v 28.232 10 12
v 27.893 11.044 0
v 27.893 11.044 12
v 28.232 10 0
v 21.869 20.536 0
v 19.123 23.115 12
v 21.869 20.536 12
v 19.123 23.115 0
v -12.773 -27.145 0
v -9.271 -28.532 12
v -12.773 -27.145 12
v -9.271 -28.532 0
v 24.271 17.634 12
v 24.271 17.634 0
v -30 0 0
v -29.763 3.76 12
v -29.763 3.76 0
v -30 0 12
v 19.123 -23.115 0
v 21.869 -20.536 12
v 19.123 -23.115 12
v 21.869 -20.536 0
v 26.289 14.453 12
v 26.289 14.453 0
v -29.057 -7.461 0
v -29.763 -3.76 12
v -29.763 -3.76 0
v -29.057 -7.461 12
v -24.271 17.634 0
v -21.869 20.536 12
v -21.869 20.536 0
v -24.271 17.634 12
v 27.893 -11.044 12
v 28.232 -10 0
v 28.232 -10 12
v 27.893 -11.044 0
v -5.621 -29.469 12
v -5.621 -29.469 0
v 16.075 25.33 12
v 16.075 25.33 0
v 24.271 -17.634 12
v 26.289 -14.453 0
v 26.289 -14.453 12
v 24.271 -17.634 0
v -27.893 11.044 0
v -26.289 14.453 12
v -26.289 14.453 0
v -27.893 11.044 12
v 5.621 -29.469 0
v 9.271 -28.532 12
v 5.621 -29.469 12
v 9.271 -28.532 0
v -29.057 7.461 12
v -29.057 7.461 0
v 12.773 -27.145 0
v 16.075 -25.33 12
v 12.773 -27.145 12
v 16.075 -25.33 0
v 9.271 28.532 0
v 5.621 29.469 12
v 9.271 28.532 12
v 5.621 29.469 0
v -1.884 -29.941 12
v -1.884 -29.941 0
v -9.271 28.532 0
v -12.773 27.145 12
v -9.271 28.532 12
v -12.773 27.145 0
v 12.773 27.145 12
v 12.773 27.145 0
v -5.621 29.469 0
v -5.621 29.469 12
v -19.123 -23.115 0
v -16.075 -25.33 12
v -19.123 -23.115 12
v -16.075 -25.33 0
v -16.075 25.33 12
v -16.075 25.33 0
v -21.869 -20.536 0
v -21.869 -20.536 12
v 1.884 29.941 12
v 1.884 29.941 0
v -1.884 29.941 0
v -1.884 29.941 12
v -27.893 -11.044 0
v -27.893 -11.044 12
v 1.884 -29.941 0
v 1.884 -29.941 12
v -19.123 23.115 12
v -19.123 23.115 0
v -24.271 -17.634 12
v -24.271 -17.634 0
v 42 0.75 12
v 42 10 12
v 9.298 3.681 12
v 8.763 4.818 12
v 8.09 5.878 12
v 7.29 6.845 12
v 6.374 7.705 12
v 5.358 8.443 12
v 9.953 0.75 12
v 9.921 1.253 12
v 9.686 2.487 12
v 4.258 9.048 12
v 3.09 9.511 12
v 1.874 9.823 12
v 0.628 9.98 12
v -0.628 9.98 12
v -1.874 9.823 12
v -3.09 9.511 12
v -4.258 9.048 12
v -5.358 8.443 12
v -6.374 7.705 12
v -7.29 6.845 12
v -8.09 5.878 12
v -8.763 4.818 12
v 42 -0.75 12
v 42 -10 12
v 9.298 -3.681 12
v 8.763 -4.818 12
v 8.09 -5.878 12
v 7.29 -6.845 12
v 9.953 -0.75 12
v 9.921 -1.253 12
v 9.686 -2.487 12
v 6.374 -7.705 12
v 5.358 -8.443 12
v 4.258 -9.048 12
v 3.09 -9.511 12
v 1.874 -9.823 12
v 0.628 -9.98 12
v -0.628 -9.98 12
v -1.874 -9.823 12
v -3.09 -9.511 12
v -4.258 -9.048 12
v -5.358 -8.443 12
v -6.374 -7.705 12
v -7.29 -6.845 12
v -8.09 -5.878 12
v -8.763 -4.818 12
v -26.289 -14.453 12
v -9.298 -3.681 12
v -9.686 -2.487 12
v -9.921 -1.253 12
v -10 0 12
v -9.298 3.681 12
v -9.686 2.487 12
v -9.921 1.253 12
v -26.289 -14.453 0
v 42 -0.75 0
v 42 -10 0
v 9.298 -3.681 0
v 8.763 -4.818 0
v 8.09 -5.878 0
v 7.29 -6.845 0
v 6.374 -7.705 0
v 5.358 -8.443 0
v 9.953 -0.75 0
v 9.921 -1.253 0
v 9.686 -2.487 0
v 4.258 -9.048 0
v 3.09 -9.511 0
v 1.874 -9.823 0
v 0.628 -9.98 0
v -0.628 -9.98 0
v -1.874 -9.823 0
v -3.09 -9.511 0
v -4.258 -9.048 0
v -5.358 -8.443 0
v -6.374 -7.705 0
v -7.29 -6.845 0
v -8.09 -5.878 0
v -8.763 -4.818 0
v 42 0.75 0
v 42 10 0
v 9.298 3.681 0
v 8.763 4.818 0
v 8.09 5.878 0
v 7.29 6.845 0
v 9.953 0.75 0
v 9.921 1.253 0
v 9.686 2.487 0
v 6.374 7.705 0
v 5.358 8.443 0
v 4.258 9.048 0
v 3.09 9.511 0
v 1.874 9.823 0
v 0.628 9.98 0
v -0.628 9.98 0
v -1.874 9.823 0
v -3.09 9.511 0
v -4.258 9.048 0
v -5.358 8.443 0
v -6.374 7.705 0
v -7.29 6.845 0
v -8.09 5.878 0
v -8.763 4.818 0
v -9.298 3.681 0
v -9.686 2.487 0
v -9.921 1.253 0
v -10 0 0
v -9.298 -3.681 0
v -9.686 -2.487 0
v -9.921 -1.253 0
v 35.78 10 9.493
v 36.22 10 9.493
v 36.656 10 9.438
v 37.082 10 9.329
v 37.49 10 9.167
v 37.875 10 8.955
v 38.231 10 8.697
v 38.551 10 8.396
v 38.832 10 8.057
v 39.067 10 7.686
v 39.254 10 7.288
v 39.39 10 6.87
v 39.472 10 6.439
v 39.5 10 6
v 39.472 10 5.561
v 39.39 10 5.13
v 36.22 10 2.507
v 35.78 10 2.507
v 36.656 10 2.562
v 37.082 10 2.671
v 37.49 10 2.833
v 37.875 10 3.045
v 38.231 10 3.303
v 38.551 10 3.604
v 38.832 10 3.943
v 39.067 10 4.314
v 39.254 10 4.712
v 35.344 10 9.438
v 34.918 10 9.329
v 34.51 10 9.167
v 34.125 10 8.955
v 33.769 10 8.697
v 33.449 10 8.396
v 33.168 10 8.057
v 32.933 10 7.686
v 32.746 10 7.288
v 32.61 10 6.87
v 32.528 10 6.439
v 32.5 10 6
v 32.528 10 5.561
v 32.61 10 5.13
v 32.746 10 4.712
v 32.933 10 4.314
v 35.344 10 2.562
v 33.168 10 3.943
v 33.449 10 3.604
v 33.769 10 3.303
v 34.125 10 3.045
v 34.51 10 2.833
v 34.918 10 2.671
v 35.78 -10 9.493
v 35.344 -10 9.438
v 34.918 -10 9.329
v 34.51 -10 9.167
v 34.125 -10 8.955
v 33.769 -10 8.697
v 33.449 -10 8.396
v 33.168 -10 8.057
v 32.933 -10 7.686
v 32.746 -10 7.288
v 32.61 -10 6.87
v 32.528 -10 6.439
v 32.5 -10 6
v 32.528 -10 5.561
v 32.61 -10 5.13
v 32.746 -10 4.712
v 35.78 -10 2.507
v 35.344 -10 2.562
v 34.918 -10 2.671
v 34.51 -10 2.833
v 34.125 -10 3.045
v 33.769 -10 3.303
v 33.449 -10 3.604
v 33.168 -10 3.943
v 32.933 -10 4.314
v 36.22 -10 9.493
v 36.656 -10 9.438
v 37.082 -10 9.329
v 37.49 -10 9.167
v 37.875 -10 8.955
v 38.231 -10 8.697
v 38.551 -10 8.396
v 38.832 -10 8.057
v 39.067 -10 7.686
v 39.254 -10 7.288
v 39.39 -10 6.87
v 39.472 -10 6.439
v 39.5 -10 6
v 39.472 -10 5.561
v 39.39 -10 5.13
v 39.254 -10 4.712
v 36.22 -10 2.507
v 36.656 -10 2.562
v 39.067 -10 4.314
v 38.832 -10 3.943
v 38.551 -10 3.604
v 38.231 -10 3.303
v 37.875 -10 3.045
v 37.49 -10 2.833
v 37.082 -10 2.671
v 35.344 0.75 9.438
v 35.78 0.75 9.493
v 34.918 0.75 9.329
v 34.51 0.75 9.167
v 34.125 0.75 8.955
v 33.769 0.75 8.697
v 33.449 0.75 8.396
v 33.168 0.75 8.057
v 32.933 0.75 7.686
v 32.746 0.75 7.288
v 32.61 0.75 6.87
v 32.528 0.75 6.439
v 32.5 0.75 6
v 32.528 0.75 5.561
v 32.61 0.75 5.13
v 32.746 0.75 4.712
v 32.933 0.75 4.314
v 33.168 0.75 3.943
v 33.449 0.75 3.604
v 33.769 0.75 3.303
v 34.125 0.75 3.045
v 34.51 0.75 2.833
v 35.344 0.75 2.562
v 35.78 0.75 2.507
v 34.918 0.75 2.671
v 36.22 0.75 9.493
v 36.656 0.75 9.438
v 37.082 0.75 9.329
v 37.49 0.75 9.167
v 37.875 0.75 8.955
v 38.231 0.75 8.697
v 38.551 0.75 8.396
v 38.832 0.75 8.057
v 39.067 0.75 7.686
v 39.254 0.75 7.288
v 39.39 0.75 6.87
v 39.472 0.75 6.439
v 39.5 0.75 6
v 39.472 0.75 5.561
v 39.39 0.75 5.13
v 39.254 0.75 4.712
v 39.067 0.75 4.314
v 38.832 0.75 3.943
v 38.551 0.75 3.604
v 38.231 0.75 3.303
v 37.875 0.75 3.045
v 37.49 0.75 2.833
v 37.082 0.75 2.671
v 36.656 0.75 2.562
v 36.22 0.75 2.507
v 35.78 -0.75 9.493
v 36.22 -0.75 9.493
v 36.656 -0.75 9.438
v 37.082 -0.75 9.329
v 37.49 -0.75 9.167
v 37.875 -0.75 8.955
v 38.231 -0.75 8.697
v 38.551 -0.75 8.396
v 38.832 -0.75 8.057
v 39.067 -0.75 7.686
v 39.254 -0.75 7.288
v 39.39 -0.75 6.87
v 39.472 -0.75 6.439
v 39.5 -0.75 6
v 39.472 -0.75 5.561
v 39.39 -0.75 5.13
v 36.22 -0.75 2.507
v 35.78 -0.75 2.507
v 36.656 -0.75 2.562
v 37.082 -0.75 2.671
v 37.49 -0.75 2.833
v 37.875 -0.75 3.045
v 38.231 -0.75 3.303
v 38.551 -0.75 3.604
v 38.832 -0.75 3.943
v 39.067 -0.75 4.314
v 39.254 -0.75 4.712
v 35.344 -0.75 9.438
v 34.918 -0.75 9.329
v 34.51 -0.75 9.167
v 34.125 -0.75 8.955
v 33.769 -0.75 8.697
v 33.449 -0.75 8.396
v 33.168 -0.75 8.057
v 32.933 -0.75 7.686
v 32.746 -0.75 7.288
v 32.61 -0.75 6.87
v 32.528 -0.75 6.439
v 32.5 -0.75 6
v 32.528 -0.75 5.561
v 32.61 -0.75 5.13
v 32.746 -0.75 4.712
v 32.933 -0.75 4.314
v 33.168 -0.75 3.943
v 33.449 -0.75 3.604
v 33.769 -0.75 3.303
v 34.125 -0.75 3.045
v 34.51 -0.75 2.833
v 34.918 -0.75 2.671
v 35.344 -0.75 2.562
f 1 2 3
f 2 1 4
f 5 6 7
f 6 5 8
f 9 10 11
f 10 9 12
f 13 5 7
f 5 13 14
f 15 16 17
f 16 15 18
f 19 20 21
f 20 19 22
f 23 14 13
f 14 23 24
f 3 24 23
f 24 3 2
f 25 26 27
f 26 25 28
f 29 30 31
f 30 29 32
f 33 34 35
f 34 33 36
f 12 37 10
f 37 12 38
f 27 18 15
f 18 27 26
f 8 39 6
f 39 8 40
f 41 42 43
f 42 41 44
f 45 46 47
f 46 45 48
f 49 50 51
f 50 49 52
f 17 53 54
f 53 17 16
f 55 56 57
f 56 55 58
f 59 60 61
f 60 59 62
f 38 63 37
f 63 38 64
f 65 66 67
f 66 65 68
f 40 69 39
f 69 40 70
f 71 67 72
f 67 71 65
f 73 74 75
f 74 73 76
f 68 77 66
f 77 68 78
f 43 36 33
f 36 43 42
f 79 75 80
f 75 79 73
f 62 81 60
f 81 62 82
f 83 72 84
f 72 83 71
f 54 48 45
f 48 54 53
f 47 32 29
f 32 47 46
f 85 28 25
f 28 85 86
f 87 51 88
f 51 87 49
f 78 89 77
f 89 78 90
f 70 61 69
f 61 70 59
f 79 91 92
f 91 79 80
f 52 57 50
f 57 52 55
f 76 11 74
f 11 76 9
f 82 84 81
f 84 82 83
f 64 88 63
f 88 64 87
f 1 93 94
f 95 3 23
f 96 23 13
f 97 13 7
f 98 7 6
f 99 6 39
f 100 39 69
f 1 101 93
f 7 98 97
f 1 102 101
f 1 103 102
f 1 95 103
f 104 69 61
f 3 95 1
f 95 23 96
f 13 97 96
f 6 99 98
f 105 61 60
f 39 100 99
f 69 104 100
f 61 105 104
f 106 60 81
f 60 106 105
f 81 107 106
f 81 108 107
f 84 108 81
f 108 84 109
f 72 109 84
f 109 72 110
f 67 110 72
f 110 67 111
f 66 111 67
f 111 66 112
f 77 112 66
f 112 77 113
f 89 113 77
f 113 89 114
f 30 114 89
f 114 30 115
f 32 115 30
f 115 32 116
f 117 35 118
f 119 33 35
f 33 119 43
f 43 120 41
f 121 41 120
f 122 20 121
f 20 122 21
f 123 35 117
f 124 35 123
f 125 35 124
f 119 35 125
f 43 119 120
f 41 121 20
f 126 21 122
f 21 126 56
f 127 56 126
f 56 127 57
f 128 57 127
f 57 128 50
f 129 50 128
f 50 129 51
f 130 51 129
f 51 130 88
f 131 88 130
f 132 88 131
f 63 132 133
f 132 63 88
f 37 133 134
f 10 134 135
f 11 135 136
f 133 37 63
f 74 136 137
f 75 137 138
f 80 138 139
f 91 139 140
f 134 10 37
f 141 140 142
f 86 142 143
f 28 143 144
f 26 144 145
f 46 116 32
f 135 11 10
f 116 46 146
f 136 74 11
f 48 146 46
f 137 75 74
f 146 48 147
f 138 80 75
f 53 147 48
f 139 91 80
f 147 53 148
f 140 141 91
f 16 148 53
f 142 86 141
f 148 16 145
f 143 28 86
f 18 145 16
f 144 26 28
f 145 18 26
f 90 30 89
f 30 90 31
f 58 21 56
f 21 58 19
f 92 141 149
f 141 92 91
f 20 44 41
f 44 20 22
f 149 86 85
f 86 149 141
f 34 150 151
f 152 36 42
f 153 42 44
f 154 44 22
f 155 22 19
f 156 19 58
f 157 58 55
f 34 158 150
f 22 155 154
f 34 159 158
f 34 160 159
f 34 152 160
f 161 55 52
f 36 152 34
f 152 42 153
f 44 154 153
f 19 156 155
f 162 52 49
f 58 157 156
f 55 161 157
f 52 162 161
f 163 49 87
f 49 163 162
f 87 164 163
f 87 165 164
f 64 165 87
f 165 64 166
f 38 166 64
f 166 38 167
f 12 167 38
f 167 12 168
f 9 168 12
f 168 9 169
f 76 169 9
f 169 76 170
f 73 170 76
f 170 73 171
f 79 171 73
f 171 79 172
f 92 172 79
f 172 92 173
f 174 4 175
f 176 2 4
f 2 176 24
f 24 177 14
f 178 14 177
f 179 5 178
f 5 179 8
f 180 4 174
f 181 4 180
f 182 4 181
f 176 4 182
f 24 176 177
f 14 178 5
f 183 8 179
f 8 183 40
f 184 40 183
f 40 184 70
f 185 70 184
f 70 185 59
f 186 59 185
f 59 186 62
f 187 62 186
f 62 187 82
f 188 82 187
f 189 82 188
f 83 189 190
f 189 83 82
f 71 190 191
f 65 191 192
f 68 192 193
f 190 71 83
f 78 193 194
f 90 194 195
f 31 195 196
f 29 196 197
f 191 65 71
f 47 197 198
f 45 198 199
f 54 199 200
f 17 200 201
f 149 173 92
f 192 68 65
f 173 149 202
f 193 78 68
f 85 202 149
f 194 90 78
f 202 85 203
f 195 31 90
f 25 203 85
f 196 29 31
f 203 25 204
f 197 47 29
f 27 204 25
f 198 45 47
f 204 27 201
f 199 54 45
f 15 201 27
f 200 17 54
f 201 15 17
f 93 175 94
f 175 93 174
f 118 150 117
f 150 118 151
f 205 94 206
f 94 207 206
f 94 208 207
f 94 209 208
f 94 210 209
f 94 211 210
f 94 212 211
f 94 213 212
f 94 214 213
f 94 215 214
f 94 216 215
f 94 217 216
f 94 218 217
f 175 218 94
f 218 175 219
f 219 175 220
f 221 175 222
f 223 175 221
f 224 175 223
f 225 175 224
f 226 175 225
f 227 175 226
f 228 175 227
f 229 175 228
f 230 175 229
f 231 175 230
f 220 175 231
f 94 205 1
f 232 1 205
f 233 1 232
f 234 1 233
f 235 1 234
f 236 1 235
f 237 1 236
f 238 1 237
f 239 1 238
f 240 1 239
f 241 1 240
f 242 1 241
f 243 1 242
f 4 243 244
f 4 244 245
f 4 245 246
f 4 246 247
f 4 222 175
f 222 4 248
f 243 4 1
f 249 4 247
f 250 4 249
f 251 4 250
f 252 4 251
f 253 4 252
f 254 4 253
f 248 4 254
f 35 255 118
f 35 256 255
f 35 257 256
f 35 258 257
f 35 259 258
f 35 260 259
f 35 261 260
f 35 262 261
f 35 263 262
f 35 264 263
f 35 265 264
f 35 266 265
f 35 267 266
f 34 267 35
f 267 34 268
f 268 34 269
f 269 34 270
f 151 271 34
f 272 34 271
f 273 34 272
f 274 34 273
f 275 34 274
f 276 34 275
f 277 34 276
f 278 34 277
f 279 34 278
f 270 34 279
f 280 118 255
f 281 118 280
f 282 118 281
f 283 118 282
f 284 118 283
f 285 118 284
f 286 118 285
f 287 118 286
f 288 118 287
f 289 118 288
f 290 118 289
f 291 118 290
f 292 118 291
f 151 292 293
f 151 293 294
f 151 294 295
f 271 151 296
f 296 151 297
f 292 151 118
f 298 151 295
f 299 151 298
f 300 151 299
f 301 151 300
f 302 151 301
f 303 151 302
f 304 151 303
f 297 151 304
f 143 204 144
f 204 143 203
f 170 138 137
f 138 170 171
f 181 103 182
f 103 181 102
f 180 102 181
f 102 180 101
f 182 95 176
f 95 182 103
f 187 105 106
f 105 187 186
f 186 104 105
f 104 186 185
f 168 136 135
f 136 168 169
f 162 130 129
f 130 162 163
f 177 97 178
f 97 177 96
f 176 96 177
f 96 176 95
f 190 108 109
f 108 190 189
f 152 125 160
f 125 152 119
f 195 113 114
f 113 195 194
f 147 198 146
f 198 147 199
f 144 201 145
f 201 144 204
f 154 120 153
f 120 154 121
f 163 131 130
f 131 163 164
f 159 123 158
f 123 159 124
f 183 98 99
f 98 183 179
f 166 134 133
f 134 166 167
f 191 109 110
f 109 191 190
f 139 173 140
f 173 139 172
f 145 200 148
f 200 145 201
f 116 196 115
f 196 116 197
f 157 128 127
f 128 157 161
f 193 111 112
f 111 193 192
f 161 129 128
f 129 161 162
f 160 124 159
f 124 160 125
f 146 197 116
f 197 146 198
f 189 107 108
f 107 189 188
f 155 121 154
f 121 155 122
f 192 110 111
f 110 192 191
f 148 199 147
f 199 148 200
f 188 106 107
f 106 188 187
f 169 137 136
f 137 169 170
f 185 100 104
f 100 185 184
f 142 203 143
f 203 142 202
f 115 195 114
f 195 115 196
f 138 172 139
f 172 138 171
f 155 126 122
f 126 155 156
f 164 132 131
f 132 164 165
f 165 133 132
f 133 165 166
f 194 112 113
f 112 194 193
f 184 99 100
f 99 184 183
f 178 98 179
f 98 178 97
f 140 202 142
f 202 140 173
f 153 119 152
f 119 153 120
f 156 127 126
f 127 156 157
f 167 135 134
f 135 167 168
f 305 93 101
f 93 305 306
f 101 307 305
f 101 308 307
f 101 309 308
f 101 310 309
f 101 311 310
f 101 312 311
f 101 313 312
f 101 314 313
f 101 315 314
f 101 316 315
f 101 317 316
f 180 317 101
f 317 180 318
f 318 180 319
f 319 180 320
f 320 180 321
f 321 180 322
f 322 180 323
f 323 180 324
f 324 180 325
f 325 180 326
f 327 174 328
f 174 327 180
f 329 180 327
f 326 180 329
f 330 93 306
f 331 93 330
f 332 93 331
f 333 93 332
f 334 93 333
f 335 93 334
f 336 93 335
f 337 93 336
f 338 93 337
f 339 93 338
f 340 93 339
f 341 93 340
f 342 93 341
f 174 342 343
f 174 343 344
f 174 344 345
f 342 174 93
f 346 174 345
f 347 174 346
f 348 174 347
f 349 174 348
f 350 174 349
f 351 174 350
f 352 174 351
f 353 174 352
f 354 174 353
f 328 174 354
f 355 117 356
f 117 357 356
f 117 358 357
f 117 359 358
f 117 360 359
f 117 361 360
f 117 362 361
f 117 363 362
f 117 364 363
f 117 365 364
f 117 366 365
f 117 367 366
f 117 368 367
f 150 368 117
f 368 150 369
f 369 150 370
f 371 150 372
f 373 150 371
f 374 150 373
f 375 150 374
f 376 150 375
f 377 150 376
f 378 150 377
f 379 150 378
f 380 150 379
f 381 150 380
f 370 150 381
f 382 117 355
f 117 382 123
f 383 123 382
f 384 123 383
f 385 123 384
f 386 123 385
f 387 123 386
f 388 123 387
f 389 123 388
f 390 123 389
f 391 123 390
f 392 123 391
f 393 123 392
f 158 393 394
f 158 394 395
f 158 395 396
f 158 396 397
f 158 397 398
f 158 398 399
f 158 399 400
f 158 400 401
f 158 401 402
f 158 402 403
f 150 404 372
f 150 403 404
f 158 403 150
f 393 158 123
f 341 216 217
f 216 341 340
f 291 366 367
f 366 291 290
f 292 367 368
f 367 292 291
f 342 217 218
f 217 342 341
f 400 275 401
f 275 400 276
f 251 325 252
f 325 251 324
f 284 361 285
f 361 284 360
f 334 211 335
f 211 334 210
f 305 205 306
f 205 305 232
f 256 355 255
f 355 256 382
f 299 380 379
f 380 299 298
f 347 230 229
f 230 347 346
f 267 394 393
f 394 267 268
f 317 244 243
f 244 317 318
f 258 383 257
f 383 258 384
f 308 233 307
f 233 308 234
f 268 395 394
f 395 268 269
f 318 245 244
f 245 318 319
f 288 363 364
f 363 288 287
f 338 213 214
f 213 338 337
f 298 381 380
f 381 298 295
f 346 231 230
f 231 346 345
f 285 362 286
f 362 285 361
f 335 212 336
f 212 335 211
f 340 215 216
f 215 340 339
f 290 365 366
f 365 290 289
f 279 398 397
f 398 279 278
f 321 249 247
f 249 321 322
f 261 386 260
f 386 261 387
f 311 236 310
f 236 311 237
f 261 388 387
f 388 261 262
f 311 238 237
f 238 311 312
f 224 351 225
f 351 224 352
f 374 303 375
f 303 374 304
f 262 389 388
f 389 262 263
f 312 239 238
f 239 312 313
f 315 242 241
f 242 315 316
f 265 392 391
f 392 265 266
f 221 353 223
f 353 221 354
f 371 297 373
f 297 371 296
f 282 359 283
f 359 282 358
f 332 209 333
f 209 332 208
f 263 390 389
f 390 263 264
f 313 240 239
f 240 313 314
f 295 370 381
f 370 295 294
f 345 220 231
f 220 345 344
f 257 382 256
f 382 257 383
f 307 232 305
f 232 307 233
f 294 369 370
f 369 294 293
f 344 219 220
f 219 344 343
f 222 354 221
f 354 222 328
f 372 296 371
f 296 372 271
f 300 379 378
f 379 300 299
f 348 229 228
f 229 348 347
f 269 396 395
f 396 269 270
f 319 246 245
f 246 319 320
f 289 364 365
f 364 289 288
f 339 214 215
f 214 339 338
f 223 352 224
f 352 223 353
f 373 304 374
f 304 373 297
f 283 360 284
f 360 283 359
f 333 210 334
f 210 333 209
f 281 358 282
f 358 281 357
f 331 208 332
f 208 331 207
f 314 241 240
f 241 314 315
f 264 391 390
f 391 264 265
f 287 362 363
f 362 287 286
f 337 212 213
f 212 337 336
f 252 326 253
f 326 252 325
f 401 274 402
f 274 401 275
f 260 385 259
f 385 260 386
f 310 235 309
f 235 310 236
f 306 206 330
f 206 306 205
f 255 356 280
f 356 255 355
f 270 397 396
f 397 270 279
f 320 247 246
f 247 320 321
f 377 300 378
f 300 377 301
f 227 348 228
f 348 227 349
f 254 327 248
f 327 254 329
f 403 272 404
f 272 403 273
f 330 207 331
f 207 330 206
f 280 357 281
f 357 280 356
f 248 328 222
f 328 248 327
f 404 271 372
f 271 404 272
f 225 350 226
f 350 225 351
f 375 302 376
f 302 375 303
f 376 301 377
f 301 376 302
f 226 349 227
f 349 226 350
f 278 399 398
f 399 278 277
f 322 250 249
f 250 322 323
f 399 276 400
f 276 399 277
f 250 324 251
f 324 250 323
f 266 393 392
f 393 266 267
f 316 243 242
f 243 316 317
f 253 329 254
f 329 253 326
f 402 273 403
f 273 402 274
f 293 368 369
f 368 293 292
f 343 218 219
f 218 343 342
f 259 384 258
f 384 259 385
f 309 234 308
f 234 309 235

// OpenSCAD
// Split pipe clamp. All dimensions are millimeters.
// Preview with F5, then render with F6 before exporting.

/* [Clamp] */
// Radius of the pipe bore; add any desired fit allowance here.
pipe_radius = 10;
clamp_height = 12;
// Radial material thickness, not the outside radius.
wall_thickness = 20;
// Radius of the transverse screw hole.
screw_radius = 3.5;
slit_width = 1.5;

/* [Tabs] */
tab_length = 14;
// Tab extent on each side of the slit centerline.
tab_depth = 10;
tab_overlap = 2;

/* [Hidden] */
epsilon = 0.01;
$fn = 50;

outer_radius = pipe_radius + wall_thickness;
screw_x = outer_radius + (tab_length - tab_overlap) / 2;
cut_height = clamp_height + 2 * epsilon;

difference() {
    union() {
        cylinder(r = outer_radius, h = clamp_height);

        translate([outer_radius - tab_overlap, -tab_depth, 0])
            cube([tab_length, 2 * tab_depth, clamp_height]);
    }

    translate([0, 0, -epsilon])
        cylinder(r = pipe_radius, h = cut_height);

    translate([0, -slit_width / 2, -epsilon])
        cube([
            outer_radius + tab_length + epsilon,
            slit_width,
            cut_height
        ]);

    translate([screw_x, 0, clamp_height / 2])
        rotate([90, 0, 0])
            cylinder(
                r = screw_radius,
                h = 2 * tab_depth + 2 * epsilon,
                center = true
            );
}
